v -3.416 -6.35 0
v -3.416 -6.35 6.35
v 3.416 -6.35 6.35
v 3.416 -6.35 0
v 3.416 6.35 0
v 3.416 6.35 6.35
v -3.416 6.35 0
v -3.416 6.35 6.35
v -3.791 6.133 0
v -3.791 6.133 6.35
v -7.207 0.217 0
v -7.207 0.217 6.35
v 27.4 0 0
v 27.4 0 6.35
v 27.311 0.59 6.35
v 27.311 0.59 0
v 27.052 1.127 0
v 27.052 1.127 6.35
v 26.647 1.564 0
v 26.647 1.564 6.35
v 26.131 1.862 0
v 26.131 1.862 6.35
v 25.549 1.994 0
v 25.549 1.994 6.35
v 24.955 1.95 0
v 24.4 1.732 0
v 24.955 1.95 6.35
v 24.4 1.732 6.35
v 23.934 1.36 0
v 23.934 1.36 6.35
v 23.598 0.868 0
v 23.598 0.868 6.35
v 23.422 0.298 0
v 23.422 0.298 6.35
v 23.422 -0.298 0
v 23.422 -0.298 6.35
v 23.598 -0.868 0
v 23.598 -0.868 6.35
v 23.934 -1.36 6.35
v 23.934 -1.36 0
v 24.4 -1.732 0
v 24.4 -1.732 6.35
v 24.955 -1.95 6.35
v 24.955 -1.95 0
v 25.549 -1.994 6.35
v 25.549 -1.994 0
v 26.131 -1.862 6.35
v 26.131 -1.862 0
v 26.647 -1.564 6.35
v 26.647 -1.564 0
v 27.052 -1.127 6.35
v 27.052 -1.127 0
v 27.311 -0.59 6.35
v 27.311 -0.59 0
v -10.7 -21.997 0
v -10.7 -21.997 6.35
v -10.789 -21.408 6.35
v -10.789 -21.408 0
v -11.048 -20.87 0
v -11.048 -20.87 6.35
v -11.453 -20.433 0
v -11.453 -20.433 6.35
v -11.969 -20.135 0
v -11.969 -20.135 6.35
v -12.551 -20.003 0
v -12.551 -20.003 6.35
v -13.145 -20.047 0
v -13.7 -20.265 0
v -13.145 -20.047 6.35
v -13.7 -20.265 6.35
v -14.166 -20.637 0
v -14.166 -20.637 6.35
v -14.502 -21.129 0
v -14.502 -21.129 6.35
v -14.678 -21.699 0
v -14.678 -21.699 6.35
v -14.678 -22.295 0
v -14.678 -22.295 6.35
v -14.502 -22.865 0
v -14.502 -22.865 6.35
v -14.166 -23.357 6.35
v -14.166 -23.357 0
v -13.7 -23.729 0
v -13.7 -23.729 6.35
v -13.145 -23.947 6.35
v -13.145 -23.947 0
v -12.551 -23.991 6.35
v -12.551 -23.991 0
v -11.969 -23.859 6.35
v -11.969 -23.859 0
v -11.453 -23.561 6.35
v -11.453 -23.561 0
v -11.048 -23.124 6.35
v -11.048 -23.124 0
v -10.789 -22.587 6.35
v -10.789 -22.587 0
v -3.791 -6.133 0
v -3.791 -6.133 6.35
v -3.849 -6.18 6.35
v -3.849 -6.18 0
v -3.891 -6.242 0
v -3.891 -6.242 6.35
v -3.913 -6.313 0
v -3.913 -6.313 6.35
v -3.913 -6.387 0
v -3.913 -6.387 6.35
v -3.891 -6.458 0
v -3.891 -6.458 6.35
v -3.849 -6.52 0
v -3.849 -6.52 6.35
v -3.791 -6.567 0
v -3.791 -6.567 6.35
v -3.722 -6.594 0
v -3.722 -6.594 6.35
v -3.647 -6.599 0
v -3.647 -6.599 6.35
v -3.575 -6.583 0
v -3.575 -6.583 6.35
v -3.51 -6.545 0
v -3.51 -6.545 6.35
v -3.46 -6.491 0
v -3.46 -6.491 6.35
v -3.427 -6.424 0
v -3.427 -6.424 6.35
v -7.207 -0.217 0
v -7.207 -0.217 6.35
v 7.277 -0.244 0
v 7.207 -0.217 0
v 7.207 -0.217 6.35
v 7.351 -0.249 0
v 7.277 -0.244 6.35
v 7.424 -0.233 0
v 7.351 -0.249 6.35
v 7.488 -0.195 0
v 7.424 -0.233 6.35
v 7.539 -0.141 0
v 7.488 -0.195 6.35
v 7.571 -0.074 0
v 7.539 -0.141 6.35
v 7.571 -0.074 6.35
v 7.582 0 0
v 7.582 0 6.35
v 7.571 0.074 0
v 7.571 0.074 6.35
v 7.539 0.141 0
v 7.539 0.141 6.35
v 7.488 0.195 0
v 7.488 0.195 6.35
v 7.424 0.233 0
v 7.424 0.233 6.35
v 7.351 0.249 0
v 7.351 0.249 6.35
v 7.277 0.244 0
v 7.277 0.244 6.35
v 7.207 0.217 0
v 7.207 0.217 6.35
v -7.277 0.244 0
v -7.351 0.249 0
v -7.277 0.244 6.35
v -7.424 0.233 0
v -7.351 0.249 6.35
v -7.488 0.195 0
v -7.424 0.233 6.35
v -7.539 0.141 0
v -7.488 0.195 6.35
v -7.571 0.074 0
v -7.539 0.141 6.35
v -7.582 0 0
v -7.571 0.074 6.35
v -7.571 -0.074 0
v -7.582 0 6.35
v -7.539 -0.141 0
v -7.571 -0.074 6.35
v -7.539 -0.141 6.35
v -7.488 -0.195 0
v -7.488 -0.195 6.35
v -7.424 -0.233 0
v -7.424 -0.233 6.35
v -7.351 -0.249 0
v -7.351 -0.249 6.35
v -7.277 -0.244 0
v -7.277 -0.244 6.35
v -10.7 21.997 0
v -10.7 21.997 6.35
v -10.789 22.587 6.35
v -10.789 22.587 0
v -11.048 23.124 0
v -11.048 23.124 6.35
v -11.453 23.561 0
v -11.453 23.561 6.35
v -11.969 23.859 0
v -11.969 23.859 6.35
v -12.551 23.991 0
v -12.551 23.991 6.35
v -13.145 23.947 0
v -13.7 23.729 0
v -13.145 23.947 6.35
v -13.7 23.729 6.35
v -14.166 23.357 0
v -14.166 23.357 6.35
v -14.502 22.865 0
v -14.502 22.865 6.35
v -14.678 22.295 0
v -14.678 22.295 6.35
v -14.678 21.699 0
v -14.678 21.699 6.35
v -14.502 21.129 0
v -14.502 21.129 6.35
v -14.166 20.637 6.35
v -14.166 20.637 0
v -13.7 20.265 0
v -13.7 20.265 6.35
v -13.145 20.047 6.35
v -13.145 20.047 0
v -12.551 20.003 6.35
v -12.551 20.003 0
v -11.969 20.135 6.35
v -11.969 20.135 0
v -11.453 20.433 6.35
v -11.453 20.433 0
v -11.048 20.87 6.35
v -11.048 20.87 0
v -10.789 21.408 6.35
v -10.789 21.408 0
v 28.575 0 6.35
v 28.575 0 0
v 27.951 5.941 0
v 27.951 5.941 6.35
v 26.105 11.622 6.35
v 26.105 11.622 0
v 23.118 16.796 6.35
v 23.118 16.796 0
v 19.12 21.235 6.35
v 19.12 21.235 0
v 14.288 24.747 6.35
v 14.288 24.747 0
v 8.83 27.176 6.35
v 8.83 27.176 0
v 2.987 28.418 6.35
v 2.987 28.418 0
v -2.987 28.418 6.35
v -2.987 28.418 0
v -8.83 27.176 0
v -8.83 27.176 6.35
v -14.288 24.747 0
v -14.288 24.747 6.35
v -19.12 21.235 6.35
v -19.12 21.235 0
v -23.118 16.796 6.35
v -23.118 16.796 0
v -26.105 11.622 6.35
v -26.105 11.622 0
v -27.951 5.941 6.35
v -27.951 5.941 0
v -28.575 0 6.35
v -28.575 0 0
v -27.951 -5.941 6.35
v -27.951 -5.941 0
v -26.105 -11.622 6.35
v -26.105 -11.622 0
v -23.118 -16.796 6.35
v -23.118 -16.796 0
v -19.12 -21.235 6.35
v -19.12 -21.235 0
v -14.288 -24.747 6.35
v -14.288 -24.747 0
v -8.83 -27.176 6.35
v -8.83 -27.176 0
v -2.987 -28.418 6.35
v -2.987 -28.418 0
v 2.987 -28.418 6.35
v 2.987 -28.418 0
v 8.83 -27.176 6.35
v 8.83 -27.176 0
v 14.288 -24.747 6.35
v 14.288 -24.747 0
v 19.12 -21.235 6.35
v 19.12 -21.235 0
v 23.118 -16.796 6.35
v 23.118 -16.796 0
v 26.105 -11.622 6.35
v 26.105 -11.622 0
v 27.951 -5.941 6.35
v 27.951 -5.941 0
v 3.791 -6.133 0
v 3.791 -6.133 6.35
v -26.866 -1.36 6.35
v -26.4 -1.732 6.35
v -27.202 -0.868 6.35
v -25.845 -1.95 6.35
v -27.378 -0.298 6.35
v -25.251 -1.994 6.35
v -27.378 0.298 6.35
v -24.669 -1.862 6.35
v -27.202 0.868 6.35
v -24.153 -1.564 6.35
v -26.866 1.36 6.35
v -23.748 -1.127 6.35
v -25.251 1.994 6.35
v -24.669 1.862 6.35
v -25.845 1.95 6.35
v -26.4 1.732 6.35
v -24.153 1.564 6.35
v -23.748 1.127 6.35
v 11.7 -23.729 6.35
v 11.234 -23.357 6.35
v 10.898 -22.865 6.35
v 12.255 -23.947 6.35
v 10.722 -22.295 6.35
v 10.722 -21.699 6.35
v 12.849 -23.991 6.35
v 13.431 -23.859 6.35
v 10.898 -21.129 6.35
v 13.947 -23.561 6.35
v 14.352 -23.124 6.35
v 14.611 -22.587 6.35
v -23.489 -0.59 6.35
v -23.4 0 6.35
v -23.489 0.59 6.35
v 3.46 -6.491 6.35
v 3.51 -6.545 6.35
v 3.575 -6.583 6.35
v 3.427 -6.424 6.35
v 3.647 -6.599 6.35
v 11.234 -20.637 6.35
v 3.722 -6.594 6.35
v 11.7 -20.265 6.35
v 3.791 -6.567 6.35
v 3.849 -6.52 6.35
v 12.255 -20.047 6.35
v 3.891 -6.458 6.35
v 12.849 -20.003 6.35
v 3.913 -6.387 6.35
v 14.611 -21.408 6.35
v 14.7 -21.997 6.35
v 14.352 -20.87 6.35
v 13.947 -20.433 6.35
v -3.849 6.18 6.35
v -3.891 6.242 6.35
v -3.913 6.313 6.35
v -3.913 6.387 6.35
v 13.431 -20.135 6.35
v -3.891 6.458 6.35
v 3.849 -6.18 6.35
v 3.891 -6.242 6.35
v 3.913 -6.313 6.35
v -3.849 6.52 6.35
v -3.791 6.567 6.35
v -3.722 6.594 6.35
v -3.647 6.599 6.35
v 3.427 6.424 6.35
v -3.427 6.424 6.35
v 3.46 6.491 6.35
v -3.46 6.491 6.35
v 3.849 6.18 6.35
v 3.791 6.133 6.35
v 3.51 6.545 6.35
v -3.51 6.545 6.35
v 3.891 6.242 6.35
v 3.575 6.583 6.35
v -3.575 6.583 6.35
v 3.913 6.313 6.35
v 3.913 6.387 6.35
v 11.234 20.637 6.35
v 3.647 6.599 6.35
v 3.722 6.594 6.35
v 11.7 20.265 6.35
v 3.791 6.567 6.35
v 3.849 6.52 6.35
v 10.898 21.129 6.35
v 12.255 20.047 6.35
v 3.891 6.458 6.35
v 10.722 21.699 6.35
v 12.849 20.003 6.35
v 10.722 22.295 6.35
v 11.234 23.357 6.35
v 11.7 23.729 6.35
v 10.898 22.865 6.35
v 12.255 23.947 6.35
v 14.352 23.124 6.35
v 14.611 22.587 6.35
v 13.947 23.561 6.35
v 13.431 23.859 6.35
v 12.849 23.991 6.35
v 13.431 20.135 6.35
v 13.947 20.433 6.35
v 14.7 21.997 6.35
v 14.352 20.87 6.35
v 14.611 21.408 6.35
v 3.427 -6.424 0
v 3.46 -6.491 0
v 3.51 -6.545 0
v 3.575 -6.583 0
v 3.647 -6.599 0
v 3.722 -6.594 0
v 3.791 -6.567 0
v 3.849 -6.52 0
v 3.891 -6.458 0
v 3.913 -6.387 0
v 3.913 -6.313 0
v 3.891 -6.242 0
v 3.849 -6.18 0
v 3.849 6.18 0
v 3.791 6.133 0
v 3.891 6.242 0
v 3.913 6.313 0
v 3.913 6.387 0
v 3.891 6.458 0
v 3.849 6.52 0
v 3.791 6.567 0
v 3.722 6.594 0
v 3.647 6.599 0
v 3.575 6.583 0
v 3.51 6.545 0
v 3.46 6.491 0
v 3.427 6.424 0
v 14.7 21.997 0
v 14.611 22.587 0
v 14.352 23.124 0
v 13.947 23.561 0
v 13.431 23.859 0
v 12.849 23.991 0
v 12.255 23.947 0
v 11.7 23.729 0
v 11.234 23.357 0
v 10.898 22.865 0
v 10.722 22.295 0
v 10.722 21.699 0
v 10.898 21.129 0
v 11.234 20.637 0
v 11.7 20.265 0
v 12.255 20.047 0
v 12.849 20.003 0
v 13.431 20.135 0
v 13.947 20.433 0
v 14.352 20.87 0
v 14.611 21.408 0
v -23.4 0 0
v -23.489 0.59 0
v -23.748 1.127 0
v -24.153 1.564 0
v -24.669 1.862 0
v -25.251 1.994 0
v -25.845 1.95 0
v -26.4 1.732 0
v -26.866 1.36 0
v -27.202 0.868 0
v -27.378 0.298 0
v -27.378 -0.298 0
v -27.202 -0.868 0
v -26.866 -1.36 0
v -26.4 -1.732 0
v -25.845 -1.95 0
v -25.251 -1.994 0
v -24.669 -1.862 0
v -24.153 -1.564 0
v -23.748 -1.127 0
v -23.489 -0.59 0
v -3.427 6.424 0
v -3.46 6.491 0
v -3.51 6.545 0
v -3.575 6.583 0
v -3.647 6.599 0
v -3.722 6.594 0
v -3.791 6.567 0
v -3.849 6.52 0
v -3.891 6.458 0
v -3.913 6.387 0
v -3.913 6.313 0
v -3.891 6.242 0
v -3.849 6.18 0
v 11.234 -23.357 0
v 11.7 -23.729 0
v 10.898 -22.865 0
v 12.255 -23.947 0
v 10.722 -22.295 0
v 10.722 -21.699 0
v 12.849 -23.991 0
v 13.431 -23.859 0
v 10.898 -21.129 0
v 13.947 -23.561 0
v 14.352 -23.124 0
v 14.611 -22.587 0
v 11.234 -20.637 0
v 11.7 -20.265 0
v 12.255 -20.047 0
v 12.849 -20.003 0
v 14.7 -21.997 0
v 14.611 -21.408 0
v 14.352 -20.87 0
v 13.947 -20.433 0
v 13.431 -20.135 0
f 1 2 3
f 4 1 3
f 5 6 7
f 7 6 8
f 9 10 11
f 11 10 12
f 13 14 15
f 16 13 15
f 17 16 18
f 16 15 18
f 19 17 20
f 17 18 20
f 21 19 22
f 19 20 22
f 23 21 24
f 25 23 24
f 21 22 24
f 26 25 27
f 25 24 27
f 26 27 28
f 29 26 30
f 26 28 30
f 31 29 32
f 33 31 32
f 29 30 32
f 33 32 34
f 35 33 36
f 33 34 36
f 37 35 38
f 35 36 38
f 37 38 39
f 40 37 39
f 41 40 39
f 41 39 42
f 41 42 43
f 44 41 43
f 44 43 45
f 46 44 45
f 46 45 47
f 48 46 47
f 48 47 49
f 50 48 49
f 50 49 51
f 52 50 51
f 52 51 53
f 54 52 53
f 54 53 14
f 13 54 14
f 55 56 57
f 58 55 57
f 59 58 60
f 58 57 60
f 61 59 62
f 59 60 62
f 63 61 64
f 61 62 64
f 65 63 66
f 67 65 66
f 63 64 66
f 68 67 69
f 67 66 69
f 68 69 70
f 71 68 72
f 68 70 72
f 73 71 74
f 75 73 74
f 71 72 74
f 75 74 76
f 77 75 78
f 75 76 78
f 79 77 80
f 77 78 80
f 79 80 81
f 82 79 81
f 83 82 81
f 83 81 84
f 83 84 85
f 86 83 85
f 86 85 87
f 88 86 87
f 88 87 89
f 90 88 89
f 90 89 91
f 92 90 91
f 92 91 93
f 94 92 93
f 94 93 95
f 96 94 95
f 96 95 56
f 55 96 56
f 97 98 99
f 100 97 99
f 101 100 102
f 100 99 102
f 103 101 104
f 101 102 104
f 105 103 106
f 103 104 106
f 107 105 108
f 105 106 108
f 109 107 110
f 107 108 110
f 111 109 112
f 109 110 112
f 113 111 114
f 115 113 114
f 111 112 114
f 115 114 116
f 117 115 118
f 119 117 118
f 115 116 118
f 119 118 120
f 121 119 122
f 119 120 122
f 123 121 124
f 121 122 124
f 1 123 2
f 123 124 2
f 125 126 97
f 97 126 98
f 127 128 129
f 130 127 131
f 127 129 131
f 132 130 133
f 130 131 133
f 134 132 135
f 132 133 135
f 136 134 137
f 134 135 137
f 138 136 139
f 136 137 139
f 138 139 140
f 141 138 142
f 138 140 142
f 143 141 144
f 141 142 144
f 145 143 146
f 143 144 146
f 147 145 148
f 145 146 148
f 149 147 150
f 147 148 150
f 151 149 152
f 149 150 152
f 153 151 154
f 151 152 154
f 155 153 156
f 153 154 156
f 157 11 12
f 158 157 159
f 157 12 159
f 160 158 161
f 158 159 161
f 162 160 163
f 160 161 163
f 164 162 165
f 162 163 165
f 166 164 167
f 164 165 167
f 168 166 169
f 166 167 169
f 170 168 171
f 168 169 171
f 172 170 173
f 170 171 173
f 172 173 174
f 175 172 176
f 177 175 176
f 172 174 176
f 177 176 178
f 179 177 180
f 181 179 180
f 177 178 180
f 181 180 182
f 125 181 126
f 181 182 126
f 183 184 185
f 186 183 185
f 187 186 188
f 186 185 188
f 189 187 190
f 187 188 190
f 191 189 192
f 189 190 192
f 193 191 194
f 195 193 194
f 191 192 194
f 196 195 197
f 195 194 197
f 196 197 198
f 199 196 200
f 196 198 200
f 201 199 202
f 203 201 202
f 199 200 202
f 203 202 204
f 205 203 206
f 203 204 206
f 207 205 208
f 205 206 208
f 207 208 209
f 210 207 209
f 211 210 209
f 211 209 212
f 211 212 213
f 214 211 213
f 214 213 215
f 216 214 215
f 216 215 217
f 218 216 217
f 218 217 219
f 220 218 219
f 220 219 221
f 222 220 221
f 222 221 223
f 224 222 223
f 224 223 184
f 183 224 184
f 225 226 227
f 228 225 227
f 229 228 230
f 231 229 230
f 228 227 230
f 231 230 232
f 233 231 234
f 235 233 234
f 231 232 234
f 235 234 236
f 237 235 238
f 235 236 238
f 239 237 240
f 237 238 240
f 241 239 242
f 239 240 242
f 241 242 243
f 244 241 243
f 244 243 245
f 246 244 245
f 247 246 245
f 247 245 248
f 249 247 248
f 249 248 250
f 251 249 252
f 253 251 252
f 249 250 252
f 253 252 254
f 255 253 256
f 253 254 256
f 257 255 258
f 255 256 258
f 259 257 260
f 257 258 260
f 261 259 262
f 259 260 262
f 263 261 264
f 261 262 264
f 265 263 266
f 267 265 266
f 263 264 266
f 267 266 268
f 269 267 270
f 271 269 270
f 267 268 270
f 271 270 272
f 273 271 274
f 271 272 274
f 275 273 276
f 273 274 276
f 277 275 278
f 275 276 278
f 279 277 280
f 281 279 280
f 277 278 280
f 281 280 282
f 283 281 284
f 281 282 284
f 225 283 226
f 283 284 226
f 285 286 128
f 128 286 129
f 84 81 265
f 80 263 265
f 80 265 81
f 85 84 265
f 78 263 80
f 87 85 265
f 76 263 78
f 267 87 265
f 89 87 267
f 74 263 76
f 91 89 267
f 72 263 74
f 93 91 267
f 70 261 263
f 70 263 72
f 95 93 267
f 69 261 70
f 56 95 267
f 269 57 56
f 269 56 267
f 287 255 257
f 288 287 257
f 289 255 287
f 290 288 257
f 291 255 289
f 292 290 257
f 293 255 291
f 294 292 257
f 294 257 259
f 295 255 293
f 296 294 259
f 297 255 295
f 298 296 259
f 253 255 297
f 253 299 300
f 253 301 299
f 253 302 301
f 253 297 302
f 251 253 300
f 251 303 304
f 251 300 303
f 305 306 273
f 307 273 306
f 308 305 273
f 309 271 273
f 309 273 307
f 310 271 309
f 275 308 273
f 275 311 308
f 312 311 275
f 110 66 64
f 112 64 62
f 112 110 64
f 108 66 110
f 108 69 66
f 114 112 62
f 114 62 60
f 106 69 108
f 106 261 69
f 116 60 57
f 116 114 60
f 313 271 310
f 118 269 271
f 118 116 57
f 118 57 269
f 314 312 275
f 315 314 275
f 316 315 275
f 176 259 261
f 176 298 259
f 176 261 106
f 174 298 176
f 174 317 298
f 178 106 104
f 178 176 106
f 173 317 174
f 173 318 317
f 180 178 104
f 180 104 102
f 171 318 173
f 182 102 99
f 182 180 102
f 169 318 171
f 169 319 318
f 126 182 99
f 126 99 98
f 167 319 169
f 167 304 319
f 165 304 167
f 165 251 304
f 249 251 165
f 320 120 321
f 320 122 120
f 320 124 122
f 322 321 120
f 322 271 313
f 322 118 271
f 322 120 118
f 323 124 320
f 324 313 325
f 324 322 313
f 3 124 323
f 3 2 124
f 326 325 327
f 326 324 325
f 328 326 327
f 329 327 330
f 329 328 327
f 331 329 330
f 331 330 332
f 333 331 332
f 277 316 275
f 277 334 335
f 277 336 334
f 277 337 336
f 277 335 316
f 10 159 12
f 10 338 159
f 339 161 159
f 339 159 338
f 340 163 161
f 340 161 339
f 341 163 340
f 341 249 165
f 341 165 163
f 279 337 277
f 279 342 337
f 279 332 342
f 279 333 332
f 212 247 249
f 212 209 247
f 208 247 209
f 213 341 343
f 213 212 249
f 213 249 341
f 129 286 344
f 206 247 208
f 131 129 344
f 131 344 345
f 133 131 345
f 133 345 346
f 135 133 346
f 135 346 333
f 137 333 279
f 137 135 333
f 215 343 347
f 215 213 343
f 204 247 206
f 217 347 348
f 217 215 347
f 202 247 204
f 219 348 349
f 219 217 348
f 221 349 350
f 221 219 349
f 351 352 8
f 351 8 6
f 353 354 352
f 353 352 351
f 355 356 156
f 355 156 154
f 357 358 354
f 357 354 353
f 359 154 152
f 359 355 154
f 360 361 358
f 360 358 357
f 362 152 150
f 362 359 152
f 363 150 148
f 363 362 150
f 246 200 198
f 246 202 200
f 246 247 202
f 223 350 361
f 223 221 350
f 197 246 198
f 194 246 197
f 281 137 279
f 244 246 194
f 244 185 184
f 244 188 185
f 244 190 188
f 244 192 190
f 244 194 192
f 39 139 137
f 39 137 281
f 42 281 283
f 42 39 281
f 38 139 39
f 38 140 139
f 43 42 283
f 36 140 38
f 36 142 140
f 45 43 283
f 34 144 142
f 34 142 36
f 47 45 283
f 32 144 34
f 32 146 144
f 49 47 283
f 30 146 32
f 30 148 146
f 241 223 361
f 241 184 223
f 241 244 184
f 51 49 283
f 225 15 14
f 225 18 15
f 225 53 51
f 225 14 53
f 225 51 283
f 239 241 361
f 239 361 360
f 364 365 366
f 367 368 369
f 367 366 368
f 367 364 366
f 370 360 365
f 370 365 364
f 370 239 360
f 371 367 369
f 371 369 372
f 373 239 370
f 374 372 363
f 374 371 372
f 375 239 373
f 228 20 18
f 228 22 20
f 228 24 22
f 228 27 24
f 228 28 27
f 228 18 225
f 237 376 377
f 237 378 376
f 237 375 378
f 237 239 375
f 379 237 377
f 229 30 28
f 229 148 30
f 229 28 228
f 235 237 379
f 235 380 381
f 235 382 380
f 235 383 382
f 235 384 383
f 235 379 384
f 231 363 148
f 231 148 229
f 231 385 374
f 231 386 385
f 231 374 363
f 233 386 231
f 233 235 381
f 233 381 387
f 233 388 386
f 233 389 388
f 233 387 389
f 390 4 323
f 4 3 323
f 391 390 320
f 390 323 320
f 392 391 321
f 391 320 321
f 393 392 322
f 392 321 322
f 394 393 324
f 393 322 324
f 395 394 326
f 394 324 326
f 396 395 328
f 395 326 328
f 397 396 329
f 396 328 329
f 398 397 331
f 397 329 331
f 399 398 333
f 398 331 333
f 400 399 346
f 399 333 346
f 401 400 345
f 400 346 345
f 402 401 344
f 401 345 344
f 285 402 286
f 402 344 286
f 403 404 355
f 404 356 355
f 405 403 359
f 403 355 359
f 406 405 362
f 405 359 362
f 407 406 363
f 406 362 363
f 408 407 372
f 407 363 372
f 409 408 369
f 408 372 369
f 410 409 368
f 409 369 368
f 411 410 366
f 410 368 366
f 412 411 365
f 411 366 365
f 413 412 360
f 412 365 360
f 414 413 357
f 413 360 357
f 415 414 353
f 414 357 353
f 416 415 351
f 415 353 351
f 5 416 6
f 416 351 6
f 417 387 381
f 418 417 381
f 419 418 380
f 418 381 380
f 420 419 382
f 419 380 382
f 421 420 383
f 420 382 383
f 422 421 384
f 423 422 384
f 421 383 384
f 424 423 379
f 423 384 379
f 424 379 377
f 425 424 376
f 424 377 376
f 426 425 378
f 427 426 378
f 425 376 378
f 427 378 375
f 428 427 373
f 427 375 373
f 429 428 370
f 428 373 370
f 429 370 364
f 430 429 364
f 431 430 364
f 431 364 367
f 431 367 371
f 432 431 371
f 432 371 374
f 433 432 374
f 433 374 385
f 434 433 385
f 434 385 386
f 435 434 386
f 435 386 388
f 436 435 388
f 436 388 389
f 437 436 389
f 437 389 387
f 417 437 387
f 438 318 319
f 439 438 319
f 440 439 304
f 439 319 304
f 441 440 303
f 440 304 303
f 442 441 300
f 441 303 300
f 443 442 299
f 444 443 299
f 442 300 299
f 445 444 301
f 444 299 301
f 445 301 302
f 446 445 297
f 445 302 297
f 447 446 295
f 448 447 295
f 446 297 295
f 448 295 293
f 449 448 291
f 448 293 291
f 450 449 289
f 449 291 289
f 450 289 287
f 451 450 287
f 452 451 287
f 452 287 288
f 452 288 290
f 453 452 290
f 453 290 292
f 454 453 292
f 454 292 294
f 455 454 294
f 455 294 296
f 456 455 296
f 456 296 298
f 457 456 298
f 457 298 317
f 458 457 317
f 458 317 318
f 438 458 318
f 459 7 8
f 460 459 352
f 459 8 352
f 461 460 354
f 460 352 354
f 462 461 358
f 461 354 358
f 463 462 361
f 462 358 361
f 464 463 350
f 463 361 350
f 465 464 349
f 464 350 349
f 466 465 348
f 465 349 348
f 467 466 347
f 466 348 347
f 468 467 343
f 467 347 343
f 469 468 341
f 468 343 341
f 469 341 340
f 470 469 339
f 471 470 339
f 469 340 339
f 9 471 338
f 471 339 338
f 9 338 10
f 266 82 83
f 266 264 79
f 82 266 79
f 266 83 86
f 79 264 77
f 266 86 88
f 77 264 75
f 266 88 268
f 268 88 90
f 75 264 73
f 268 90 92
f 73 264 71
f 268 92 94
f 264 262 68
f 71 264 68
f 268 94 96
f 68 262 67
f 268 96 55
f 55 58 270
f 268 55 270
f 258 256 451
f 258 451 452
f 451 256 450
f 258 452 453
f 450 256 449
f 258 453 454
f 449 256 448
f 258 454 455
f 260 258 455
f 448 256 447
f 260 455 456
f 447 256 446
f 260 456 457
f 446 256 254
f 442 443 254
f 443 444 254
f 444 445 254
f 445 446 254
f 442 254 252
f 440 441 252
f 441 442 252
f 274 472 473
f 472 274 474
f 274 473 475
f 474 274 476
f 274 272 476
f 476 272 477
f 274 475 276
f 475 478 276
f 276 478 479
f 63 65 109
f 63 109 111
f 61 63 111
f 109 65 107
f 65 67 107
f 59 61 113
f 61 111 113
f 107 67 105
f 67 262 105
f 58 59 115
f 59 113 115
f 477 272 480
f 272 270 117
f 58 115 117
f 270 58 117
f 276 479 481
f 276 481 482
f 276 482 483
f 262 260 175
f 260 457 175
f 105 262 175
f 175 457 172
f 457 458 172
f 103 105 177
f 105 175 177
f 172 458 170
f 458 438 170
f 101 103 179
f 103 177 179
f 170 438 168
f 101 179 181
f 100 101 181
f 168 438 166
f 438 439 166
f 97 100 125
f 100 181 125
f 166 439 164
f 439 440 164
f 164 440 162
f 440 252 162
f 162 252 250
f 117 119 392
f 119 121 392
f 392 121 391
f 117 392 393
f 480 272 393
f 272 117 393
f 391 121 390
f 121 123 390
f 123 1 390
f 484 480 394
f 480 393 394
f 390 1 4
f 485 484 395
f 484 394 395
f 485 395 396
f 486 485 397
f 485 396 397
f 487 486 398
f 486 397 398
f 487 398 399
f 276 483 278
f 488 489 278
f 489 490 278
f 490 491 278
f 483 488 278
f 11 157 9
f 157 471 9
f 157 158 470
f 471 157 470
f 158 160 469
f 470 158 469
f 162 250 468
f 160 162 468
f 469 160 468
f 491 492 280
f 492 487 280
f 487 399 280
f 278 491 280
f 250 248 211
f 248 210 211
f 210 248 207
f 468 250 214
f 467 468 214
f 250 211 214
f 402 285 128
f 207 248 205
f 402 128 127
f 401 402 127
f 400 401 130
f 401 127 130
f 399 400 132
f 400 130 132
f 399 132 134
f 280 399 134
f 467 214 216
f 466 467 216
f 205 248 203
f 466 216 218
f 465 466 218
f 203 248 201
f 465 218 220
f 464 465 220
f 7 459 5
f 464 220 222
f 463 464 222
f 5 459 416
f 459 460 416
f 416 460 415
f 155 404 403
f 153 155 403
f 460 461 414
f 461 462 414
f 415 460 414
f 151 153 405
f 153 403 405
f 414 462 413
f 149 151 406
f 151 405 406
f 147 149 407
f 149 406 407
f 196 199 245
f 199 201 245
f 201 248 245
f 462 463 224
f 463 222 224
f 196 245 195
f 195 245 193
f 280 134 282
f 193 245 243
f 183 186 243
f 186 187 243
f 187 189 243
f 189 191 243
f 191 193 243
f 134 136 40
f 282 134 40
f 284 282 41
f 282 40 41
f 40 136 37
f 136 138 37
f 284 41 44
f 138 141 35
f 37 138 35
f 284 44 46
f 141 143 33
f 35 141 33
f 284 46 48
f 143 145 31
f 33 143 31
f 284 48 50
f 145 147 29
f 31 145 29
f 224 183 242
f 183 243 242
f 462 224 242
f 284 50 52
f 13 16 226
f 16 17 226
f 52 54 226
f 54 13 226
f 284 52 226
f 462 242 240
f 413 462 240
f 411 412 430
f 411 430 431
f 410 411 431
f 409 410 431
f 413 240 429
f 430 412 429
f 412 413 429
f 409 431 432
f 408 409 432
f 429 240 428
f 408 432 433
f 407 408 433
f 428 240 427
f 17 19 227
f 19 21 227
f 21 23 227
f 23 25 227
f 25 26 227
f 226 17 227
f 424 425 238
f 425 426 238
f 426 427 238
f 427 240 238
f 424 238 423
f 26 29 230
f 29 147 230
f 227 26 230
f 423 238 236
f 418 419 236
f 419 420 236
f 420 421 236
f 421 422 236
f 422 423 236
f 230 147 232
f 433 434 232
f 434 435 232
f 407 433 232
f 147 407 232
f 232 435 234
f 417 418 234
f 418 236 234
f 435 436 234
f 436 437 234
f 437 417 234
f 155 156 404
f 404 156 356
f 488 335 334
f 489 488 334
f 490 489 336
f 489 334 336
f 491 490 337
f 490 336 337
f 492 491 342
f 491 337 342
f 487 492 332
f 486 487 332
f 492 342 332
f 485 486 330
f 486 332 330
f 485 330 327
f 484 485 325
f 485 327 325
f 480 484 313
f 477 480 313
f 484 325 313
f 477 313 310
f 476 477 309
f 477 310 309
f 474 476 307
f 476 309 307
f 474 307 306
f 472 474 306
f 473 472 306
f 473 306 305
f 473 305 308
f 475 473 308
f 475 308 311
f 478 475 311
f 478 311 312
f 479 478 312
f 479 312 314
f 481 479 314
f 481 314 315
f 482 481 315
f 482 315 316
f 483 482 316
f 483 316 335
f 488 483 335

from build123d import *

# Parameters (mm, degrees)
SKETCH1_R           = 28.575
BOSS_EXTRUDE1_DEPTH = 6.35
SKETCH2_R           = 14.2875
BOSS_EXTRUDE2_DEPTH = 12.7
CUT_EXTRUDE1_DEPTH  = 20.05
SKETCH4_R           = 2
CUT_EXTRUDE2_DEPTH  = 7.35
FILLET1_R           = 1
SKETCH5_R           = 14.2875
CUT_EXTRUDE4_DEPTH  = 12.7
SKETCH7_R           = 0.25
CUT_EXTRUDE5_DEPTH  = 12.7


with BuildPart() as part:
    # Sketch1 → Boss-Extrude1 (new body)
    with BuildSketch(Plane.XY):
        Circle(SKETCH1_R)
    extrude(amount=BOSS_EXTRUDE1_DEPTH)

    # Sketch2 → Boss-Extrude2 (add)
    with BuildSketch(Plane.XY.offset(6.35)):
        Circle(SKETCH2_R)
    extrude(amount=BOSS_EXTRUDE2_DEPTH)

    # Sketch3 → Cut-Extrude1 (cut, through all)
    with BuildSketch(Plane.XY.offset(19.05)):
        Polygon((7.332348419, 0), (3.666174209, 6.35), (-3.666174209, 6.35), (-7.332348419, 0), (-3.666174209, -6.35), (3.666174209, -6.35), align=None)
    extrude(amount=-CUT_EXTRUDE1_DEPTH, mode=Mode.SUBTRACT)

    # Sketch4 → Cut-Extrude2 (cut, through all)
    with BuildSketch(Plane.XY.offset(6.35)):
        with Locations((25.4, 0)):
            Circle(SKETCH4_R)
        with Locations((12.7, -21.997045256)):
            Circle(SKETCH4_R)
        with Locations((-12.7, -21.997045256)):
            Circle(SKETCH4_R)
        with Locations((-25.4, 0)):
            Circle(SKETCH4_R)
        with Locations((-12.7, 21.997045256)):
            Circle(SKETCH4_R)
        with Locations((12.7, 21.997045256)):
            Circle(SKETCH4_R)
    extrude(amount=-CUT_EXTRUDE2_DEPTH, mode=Mode.SUBTRACT)

    # Fillet1
    fillet1_edges = [part.edges().sort_by_distance(p)[0] for p in [
        (5.499261314, -3.175, 19.05),
        (5.499261314, 3.175, 19.05),
        (0, 6.35, 19.05),
        (-5.499261314, 3.175, 19.05),
        (-5.499261314, -3.175, 19.05),
        (0, -6.35, 19.05),
    ]]
    fillet(fillet1_edges, radius=FILLET1_R)

    # Sketch5 → Cut-Extrude4 (cut)
    with BuildSketch(Plane.XY.offset(19.05)):
        Circle(SKETCH5_R)
    extrude(amount=-CUT_EXTRUDE4_DEPTH, mode=Mode.SUBTRACT)

    # Sketch7 → Cut-Extrude5 (cut)
    with BuildSketch(Plane.XY.offset(6.35)):
        with Locations((-3.666174209, 6.35)):
            Circle(SKETCH7_R)
        with Locations((3.666174209, 6.35)):
            Circle(SKETCH7_R)
        with Locations((7.332348419, 0)):
            Circle(SKETCH7_R)
        with Locations((3.666174209, -6.35)):
            Circle(SKETCH7_R)
        with Locations((-3.666174209, -6.35)):
            Circle(SKETCH7_R)
        with Locations((-7.332348419, 0)):
            Circle(SKETCH7_R)
    extrude(amount=-CUT_EXTRUDE5_DEPTH, mode=Mode.SUBTRACT)


solid = part.part
